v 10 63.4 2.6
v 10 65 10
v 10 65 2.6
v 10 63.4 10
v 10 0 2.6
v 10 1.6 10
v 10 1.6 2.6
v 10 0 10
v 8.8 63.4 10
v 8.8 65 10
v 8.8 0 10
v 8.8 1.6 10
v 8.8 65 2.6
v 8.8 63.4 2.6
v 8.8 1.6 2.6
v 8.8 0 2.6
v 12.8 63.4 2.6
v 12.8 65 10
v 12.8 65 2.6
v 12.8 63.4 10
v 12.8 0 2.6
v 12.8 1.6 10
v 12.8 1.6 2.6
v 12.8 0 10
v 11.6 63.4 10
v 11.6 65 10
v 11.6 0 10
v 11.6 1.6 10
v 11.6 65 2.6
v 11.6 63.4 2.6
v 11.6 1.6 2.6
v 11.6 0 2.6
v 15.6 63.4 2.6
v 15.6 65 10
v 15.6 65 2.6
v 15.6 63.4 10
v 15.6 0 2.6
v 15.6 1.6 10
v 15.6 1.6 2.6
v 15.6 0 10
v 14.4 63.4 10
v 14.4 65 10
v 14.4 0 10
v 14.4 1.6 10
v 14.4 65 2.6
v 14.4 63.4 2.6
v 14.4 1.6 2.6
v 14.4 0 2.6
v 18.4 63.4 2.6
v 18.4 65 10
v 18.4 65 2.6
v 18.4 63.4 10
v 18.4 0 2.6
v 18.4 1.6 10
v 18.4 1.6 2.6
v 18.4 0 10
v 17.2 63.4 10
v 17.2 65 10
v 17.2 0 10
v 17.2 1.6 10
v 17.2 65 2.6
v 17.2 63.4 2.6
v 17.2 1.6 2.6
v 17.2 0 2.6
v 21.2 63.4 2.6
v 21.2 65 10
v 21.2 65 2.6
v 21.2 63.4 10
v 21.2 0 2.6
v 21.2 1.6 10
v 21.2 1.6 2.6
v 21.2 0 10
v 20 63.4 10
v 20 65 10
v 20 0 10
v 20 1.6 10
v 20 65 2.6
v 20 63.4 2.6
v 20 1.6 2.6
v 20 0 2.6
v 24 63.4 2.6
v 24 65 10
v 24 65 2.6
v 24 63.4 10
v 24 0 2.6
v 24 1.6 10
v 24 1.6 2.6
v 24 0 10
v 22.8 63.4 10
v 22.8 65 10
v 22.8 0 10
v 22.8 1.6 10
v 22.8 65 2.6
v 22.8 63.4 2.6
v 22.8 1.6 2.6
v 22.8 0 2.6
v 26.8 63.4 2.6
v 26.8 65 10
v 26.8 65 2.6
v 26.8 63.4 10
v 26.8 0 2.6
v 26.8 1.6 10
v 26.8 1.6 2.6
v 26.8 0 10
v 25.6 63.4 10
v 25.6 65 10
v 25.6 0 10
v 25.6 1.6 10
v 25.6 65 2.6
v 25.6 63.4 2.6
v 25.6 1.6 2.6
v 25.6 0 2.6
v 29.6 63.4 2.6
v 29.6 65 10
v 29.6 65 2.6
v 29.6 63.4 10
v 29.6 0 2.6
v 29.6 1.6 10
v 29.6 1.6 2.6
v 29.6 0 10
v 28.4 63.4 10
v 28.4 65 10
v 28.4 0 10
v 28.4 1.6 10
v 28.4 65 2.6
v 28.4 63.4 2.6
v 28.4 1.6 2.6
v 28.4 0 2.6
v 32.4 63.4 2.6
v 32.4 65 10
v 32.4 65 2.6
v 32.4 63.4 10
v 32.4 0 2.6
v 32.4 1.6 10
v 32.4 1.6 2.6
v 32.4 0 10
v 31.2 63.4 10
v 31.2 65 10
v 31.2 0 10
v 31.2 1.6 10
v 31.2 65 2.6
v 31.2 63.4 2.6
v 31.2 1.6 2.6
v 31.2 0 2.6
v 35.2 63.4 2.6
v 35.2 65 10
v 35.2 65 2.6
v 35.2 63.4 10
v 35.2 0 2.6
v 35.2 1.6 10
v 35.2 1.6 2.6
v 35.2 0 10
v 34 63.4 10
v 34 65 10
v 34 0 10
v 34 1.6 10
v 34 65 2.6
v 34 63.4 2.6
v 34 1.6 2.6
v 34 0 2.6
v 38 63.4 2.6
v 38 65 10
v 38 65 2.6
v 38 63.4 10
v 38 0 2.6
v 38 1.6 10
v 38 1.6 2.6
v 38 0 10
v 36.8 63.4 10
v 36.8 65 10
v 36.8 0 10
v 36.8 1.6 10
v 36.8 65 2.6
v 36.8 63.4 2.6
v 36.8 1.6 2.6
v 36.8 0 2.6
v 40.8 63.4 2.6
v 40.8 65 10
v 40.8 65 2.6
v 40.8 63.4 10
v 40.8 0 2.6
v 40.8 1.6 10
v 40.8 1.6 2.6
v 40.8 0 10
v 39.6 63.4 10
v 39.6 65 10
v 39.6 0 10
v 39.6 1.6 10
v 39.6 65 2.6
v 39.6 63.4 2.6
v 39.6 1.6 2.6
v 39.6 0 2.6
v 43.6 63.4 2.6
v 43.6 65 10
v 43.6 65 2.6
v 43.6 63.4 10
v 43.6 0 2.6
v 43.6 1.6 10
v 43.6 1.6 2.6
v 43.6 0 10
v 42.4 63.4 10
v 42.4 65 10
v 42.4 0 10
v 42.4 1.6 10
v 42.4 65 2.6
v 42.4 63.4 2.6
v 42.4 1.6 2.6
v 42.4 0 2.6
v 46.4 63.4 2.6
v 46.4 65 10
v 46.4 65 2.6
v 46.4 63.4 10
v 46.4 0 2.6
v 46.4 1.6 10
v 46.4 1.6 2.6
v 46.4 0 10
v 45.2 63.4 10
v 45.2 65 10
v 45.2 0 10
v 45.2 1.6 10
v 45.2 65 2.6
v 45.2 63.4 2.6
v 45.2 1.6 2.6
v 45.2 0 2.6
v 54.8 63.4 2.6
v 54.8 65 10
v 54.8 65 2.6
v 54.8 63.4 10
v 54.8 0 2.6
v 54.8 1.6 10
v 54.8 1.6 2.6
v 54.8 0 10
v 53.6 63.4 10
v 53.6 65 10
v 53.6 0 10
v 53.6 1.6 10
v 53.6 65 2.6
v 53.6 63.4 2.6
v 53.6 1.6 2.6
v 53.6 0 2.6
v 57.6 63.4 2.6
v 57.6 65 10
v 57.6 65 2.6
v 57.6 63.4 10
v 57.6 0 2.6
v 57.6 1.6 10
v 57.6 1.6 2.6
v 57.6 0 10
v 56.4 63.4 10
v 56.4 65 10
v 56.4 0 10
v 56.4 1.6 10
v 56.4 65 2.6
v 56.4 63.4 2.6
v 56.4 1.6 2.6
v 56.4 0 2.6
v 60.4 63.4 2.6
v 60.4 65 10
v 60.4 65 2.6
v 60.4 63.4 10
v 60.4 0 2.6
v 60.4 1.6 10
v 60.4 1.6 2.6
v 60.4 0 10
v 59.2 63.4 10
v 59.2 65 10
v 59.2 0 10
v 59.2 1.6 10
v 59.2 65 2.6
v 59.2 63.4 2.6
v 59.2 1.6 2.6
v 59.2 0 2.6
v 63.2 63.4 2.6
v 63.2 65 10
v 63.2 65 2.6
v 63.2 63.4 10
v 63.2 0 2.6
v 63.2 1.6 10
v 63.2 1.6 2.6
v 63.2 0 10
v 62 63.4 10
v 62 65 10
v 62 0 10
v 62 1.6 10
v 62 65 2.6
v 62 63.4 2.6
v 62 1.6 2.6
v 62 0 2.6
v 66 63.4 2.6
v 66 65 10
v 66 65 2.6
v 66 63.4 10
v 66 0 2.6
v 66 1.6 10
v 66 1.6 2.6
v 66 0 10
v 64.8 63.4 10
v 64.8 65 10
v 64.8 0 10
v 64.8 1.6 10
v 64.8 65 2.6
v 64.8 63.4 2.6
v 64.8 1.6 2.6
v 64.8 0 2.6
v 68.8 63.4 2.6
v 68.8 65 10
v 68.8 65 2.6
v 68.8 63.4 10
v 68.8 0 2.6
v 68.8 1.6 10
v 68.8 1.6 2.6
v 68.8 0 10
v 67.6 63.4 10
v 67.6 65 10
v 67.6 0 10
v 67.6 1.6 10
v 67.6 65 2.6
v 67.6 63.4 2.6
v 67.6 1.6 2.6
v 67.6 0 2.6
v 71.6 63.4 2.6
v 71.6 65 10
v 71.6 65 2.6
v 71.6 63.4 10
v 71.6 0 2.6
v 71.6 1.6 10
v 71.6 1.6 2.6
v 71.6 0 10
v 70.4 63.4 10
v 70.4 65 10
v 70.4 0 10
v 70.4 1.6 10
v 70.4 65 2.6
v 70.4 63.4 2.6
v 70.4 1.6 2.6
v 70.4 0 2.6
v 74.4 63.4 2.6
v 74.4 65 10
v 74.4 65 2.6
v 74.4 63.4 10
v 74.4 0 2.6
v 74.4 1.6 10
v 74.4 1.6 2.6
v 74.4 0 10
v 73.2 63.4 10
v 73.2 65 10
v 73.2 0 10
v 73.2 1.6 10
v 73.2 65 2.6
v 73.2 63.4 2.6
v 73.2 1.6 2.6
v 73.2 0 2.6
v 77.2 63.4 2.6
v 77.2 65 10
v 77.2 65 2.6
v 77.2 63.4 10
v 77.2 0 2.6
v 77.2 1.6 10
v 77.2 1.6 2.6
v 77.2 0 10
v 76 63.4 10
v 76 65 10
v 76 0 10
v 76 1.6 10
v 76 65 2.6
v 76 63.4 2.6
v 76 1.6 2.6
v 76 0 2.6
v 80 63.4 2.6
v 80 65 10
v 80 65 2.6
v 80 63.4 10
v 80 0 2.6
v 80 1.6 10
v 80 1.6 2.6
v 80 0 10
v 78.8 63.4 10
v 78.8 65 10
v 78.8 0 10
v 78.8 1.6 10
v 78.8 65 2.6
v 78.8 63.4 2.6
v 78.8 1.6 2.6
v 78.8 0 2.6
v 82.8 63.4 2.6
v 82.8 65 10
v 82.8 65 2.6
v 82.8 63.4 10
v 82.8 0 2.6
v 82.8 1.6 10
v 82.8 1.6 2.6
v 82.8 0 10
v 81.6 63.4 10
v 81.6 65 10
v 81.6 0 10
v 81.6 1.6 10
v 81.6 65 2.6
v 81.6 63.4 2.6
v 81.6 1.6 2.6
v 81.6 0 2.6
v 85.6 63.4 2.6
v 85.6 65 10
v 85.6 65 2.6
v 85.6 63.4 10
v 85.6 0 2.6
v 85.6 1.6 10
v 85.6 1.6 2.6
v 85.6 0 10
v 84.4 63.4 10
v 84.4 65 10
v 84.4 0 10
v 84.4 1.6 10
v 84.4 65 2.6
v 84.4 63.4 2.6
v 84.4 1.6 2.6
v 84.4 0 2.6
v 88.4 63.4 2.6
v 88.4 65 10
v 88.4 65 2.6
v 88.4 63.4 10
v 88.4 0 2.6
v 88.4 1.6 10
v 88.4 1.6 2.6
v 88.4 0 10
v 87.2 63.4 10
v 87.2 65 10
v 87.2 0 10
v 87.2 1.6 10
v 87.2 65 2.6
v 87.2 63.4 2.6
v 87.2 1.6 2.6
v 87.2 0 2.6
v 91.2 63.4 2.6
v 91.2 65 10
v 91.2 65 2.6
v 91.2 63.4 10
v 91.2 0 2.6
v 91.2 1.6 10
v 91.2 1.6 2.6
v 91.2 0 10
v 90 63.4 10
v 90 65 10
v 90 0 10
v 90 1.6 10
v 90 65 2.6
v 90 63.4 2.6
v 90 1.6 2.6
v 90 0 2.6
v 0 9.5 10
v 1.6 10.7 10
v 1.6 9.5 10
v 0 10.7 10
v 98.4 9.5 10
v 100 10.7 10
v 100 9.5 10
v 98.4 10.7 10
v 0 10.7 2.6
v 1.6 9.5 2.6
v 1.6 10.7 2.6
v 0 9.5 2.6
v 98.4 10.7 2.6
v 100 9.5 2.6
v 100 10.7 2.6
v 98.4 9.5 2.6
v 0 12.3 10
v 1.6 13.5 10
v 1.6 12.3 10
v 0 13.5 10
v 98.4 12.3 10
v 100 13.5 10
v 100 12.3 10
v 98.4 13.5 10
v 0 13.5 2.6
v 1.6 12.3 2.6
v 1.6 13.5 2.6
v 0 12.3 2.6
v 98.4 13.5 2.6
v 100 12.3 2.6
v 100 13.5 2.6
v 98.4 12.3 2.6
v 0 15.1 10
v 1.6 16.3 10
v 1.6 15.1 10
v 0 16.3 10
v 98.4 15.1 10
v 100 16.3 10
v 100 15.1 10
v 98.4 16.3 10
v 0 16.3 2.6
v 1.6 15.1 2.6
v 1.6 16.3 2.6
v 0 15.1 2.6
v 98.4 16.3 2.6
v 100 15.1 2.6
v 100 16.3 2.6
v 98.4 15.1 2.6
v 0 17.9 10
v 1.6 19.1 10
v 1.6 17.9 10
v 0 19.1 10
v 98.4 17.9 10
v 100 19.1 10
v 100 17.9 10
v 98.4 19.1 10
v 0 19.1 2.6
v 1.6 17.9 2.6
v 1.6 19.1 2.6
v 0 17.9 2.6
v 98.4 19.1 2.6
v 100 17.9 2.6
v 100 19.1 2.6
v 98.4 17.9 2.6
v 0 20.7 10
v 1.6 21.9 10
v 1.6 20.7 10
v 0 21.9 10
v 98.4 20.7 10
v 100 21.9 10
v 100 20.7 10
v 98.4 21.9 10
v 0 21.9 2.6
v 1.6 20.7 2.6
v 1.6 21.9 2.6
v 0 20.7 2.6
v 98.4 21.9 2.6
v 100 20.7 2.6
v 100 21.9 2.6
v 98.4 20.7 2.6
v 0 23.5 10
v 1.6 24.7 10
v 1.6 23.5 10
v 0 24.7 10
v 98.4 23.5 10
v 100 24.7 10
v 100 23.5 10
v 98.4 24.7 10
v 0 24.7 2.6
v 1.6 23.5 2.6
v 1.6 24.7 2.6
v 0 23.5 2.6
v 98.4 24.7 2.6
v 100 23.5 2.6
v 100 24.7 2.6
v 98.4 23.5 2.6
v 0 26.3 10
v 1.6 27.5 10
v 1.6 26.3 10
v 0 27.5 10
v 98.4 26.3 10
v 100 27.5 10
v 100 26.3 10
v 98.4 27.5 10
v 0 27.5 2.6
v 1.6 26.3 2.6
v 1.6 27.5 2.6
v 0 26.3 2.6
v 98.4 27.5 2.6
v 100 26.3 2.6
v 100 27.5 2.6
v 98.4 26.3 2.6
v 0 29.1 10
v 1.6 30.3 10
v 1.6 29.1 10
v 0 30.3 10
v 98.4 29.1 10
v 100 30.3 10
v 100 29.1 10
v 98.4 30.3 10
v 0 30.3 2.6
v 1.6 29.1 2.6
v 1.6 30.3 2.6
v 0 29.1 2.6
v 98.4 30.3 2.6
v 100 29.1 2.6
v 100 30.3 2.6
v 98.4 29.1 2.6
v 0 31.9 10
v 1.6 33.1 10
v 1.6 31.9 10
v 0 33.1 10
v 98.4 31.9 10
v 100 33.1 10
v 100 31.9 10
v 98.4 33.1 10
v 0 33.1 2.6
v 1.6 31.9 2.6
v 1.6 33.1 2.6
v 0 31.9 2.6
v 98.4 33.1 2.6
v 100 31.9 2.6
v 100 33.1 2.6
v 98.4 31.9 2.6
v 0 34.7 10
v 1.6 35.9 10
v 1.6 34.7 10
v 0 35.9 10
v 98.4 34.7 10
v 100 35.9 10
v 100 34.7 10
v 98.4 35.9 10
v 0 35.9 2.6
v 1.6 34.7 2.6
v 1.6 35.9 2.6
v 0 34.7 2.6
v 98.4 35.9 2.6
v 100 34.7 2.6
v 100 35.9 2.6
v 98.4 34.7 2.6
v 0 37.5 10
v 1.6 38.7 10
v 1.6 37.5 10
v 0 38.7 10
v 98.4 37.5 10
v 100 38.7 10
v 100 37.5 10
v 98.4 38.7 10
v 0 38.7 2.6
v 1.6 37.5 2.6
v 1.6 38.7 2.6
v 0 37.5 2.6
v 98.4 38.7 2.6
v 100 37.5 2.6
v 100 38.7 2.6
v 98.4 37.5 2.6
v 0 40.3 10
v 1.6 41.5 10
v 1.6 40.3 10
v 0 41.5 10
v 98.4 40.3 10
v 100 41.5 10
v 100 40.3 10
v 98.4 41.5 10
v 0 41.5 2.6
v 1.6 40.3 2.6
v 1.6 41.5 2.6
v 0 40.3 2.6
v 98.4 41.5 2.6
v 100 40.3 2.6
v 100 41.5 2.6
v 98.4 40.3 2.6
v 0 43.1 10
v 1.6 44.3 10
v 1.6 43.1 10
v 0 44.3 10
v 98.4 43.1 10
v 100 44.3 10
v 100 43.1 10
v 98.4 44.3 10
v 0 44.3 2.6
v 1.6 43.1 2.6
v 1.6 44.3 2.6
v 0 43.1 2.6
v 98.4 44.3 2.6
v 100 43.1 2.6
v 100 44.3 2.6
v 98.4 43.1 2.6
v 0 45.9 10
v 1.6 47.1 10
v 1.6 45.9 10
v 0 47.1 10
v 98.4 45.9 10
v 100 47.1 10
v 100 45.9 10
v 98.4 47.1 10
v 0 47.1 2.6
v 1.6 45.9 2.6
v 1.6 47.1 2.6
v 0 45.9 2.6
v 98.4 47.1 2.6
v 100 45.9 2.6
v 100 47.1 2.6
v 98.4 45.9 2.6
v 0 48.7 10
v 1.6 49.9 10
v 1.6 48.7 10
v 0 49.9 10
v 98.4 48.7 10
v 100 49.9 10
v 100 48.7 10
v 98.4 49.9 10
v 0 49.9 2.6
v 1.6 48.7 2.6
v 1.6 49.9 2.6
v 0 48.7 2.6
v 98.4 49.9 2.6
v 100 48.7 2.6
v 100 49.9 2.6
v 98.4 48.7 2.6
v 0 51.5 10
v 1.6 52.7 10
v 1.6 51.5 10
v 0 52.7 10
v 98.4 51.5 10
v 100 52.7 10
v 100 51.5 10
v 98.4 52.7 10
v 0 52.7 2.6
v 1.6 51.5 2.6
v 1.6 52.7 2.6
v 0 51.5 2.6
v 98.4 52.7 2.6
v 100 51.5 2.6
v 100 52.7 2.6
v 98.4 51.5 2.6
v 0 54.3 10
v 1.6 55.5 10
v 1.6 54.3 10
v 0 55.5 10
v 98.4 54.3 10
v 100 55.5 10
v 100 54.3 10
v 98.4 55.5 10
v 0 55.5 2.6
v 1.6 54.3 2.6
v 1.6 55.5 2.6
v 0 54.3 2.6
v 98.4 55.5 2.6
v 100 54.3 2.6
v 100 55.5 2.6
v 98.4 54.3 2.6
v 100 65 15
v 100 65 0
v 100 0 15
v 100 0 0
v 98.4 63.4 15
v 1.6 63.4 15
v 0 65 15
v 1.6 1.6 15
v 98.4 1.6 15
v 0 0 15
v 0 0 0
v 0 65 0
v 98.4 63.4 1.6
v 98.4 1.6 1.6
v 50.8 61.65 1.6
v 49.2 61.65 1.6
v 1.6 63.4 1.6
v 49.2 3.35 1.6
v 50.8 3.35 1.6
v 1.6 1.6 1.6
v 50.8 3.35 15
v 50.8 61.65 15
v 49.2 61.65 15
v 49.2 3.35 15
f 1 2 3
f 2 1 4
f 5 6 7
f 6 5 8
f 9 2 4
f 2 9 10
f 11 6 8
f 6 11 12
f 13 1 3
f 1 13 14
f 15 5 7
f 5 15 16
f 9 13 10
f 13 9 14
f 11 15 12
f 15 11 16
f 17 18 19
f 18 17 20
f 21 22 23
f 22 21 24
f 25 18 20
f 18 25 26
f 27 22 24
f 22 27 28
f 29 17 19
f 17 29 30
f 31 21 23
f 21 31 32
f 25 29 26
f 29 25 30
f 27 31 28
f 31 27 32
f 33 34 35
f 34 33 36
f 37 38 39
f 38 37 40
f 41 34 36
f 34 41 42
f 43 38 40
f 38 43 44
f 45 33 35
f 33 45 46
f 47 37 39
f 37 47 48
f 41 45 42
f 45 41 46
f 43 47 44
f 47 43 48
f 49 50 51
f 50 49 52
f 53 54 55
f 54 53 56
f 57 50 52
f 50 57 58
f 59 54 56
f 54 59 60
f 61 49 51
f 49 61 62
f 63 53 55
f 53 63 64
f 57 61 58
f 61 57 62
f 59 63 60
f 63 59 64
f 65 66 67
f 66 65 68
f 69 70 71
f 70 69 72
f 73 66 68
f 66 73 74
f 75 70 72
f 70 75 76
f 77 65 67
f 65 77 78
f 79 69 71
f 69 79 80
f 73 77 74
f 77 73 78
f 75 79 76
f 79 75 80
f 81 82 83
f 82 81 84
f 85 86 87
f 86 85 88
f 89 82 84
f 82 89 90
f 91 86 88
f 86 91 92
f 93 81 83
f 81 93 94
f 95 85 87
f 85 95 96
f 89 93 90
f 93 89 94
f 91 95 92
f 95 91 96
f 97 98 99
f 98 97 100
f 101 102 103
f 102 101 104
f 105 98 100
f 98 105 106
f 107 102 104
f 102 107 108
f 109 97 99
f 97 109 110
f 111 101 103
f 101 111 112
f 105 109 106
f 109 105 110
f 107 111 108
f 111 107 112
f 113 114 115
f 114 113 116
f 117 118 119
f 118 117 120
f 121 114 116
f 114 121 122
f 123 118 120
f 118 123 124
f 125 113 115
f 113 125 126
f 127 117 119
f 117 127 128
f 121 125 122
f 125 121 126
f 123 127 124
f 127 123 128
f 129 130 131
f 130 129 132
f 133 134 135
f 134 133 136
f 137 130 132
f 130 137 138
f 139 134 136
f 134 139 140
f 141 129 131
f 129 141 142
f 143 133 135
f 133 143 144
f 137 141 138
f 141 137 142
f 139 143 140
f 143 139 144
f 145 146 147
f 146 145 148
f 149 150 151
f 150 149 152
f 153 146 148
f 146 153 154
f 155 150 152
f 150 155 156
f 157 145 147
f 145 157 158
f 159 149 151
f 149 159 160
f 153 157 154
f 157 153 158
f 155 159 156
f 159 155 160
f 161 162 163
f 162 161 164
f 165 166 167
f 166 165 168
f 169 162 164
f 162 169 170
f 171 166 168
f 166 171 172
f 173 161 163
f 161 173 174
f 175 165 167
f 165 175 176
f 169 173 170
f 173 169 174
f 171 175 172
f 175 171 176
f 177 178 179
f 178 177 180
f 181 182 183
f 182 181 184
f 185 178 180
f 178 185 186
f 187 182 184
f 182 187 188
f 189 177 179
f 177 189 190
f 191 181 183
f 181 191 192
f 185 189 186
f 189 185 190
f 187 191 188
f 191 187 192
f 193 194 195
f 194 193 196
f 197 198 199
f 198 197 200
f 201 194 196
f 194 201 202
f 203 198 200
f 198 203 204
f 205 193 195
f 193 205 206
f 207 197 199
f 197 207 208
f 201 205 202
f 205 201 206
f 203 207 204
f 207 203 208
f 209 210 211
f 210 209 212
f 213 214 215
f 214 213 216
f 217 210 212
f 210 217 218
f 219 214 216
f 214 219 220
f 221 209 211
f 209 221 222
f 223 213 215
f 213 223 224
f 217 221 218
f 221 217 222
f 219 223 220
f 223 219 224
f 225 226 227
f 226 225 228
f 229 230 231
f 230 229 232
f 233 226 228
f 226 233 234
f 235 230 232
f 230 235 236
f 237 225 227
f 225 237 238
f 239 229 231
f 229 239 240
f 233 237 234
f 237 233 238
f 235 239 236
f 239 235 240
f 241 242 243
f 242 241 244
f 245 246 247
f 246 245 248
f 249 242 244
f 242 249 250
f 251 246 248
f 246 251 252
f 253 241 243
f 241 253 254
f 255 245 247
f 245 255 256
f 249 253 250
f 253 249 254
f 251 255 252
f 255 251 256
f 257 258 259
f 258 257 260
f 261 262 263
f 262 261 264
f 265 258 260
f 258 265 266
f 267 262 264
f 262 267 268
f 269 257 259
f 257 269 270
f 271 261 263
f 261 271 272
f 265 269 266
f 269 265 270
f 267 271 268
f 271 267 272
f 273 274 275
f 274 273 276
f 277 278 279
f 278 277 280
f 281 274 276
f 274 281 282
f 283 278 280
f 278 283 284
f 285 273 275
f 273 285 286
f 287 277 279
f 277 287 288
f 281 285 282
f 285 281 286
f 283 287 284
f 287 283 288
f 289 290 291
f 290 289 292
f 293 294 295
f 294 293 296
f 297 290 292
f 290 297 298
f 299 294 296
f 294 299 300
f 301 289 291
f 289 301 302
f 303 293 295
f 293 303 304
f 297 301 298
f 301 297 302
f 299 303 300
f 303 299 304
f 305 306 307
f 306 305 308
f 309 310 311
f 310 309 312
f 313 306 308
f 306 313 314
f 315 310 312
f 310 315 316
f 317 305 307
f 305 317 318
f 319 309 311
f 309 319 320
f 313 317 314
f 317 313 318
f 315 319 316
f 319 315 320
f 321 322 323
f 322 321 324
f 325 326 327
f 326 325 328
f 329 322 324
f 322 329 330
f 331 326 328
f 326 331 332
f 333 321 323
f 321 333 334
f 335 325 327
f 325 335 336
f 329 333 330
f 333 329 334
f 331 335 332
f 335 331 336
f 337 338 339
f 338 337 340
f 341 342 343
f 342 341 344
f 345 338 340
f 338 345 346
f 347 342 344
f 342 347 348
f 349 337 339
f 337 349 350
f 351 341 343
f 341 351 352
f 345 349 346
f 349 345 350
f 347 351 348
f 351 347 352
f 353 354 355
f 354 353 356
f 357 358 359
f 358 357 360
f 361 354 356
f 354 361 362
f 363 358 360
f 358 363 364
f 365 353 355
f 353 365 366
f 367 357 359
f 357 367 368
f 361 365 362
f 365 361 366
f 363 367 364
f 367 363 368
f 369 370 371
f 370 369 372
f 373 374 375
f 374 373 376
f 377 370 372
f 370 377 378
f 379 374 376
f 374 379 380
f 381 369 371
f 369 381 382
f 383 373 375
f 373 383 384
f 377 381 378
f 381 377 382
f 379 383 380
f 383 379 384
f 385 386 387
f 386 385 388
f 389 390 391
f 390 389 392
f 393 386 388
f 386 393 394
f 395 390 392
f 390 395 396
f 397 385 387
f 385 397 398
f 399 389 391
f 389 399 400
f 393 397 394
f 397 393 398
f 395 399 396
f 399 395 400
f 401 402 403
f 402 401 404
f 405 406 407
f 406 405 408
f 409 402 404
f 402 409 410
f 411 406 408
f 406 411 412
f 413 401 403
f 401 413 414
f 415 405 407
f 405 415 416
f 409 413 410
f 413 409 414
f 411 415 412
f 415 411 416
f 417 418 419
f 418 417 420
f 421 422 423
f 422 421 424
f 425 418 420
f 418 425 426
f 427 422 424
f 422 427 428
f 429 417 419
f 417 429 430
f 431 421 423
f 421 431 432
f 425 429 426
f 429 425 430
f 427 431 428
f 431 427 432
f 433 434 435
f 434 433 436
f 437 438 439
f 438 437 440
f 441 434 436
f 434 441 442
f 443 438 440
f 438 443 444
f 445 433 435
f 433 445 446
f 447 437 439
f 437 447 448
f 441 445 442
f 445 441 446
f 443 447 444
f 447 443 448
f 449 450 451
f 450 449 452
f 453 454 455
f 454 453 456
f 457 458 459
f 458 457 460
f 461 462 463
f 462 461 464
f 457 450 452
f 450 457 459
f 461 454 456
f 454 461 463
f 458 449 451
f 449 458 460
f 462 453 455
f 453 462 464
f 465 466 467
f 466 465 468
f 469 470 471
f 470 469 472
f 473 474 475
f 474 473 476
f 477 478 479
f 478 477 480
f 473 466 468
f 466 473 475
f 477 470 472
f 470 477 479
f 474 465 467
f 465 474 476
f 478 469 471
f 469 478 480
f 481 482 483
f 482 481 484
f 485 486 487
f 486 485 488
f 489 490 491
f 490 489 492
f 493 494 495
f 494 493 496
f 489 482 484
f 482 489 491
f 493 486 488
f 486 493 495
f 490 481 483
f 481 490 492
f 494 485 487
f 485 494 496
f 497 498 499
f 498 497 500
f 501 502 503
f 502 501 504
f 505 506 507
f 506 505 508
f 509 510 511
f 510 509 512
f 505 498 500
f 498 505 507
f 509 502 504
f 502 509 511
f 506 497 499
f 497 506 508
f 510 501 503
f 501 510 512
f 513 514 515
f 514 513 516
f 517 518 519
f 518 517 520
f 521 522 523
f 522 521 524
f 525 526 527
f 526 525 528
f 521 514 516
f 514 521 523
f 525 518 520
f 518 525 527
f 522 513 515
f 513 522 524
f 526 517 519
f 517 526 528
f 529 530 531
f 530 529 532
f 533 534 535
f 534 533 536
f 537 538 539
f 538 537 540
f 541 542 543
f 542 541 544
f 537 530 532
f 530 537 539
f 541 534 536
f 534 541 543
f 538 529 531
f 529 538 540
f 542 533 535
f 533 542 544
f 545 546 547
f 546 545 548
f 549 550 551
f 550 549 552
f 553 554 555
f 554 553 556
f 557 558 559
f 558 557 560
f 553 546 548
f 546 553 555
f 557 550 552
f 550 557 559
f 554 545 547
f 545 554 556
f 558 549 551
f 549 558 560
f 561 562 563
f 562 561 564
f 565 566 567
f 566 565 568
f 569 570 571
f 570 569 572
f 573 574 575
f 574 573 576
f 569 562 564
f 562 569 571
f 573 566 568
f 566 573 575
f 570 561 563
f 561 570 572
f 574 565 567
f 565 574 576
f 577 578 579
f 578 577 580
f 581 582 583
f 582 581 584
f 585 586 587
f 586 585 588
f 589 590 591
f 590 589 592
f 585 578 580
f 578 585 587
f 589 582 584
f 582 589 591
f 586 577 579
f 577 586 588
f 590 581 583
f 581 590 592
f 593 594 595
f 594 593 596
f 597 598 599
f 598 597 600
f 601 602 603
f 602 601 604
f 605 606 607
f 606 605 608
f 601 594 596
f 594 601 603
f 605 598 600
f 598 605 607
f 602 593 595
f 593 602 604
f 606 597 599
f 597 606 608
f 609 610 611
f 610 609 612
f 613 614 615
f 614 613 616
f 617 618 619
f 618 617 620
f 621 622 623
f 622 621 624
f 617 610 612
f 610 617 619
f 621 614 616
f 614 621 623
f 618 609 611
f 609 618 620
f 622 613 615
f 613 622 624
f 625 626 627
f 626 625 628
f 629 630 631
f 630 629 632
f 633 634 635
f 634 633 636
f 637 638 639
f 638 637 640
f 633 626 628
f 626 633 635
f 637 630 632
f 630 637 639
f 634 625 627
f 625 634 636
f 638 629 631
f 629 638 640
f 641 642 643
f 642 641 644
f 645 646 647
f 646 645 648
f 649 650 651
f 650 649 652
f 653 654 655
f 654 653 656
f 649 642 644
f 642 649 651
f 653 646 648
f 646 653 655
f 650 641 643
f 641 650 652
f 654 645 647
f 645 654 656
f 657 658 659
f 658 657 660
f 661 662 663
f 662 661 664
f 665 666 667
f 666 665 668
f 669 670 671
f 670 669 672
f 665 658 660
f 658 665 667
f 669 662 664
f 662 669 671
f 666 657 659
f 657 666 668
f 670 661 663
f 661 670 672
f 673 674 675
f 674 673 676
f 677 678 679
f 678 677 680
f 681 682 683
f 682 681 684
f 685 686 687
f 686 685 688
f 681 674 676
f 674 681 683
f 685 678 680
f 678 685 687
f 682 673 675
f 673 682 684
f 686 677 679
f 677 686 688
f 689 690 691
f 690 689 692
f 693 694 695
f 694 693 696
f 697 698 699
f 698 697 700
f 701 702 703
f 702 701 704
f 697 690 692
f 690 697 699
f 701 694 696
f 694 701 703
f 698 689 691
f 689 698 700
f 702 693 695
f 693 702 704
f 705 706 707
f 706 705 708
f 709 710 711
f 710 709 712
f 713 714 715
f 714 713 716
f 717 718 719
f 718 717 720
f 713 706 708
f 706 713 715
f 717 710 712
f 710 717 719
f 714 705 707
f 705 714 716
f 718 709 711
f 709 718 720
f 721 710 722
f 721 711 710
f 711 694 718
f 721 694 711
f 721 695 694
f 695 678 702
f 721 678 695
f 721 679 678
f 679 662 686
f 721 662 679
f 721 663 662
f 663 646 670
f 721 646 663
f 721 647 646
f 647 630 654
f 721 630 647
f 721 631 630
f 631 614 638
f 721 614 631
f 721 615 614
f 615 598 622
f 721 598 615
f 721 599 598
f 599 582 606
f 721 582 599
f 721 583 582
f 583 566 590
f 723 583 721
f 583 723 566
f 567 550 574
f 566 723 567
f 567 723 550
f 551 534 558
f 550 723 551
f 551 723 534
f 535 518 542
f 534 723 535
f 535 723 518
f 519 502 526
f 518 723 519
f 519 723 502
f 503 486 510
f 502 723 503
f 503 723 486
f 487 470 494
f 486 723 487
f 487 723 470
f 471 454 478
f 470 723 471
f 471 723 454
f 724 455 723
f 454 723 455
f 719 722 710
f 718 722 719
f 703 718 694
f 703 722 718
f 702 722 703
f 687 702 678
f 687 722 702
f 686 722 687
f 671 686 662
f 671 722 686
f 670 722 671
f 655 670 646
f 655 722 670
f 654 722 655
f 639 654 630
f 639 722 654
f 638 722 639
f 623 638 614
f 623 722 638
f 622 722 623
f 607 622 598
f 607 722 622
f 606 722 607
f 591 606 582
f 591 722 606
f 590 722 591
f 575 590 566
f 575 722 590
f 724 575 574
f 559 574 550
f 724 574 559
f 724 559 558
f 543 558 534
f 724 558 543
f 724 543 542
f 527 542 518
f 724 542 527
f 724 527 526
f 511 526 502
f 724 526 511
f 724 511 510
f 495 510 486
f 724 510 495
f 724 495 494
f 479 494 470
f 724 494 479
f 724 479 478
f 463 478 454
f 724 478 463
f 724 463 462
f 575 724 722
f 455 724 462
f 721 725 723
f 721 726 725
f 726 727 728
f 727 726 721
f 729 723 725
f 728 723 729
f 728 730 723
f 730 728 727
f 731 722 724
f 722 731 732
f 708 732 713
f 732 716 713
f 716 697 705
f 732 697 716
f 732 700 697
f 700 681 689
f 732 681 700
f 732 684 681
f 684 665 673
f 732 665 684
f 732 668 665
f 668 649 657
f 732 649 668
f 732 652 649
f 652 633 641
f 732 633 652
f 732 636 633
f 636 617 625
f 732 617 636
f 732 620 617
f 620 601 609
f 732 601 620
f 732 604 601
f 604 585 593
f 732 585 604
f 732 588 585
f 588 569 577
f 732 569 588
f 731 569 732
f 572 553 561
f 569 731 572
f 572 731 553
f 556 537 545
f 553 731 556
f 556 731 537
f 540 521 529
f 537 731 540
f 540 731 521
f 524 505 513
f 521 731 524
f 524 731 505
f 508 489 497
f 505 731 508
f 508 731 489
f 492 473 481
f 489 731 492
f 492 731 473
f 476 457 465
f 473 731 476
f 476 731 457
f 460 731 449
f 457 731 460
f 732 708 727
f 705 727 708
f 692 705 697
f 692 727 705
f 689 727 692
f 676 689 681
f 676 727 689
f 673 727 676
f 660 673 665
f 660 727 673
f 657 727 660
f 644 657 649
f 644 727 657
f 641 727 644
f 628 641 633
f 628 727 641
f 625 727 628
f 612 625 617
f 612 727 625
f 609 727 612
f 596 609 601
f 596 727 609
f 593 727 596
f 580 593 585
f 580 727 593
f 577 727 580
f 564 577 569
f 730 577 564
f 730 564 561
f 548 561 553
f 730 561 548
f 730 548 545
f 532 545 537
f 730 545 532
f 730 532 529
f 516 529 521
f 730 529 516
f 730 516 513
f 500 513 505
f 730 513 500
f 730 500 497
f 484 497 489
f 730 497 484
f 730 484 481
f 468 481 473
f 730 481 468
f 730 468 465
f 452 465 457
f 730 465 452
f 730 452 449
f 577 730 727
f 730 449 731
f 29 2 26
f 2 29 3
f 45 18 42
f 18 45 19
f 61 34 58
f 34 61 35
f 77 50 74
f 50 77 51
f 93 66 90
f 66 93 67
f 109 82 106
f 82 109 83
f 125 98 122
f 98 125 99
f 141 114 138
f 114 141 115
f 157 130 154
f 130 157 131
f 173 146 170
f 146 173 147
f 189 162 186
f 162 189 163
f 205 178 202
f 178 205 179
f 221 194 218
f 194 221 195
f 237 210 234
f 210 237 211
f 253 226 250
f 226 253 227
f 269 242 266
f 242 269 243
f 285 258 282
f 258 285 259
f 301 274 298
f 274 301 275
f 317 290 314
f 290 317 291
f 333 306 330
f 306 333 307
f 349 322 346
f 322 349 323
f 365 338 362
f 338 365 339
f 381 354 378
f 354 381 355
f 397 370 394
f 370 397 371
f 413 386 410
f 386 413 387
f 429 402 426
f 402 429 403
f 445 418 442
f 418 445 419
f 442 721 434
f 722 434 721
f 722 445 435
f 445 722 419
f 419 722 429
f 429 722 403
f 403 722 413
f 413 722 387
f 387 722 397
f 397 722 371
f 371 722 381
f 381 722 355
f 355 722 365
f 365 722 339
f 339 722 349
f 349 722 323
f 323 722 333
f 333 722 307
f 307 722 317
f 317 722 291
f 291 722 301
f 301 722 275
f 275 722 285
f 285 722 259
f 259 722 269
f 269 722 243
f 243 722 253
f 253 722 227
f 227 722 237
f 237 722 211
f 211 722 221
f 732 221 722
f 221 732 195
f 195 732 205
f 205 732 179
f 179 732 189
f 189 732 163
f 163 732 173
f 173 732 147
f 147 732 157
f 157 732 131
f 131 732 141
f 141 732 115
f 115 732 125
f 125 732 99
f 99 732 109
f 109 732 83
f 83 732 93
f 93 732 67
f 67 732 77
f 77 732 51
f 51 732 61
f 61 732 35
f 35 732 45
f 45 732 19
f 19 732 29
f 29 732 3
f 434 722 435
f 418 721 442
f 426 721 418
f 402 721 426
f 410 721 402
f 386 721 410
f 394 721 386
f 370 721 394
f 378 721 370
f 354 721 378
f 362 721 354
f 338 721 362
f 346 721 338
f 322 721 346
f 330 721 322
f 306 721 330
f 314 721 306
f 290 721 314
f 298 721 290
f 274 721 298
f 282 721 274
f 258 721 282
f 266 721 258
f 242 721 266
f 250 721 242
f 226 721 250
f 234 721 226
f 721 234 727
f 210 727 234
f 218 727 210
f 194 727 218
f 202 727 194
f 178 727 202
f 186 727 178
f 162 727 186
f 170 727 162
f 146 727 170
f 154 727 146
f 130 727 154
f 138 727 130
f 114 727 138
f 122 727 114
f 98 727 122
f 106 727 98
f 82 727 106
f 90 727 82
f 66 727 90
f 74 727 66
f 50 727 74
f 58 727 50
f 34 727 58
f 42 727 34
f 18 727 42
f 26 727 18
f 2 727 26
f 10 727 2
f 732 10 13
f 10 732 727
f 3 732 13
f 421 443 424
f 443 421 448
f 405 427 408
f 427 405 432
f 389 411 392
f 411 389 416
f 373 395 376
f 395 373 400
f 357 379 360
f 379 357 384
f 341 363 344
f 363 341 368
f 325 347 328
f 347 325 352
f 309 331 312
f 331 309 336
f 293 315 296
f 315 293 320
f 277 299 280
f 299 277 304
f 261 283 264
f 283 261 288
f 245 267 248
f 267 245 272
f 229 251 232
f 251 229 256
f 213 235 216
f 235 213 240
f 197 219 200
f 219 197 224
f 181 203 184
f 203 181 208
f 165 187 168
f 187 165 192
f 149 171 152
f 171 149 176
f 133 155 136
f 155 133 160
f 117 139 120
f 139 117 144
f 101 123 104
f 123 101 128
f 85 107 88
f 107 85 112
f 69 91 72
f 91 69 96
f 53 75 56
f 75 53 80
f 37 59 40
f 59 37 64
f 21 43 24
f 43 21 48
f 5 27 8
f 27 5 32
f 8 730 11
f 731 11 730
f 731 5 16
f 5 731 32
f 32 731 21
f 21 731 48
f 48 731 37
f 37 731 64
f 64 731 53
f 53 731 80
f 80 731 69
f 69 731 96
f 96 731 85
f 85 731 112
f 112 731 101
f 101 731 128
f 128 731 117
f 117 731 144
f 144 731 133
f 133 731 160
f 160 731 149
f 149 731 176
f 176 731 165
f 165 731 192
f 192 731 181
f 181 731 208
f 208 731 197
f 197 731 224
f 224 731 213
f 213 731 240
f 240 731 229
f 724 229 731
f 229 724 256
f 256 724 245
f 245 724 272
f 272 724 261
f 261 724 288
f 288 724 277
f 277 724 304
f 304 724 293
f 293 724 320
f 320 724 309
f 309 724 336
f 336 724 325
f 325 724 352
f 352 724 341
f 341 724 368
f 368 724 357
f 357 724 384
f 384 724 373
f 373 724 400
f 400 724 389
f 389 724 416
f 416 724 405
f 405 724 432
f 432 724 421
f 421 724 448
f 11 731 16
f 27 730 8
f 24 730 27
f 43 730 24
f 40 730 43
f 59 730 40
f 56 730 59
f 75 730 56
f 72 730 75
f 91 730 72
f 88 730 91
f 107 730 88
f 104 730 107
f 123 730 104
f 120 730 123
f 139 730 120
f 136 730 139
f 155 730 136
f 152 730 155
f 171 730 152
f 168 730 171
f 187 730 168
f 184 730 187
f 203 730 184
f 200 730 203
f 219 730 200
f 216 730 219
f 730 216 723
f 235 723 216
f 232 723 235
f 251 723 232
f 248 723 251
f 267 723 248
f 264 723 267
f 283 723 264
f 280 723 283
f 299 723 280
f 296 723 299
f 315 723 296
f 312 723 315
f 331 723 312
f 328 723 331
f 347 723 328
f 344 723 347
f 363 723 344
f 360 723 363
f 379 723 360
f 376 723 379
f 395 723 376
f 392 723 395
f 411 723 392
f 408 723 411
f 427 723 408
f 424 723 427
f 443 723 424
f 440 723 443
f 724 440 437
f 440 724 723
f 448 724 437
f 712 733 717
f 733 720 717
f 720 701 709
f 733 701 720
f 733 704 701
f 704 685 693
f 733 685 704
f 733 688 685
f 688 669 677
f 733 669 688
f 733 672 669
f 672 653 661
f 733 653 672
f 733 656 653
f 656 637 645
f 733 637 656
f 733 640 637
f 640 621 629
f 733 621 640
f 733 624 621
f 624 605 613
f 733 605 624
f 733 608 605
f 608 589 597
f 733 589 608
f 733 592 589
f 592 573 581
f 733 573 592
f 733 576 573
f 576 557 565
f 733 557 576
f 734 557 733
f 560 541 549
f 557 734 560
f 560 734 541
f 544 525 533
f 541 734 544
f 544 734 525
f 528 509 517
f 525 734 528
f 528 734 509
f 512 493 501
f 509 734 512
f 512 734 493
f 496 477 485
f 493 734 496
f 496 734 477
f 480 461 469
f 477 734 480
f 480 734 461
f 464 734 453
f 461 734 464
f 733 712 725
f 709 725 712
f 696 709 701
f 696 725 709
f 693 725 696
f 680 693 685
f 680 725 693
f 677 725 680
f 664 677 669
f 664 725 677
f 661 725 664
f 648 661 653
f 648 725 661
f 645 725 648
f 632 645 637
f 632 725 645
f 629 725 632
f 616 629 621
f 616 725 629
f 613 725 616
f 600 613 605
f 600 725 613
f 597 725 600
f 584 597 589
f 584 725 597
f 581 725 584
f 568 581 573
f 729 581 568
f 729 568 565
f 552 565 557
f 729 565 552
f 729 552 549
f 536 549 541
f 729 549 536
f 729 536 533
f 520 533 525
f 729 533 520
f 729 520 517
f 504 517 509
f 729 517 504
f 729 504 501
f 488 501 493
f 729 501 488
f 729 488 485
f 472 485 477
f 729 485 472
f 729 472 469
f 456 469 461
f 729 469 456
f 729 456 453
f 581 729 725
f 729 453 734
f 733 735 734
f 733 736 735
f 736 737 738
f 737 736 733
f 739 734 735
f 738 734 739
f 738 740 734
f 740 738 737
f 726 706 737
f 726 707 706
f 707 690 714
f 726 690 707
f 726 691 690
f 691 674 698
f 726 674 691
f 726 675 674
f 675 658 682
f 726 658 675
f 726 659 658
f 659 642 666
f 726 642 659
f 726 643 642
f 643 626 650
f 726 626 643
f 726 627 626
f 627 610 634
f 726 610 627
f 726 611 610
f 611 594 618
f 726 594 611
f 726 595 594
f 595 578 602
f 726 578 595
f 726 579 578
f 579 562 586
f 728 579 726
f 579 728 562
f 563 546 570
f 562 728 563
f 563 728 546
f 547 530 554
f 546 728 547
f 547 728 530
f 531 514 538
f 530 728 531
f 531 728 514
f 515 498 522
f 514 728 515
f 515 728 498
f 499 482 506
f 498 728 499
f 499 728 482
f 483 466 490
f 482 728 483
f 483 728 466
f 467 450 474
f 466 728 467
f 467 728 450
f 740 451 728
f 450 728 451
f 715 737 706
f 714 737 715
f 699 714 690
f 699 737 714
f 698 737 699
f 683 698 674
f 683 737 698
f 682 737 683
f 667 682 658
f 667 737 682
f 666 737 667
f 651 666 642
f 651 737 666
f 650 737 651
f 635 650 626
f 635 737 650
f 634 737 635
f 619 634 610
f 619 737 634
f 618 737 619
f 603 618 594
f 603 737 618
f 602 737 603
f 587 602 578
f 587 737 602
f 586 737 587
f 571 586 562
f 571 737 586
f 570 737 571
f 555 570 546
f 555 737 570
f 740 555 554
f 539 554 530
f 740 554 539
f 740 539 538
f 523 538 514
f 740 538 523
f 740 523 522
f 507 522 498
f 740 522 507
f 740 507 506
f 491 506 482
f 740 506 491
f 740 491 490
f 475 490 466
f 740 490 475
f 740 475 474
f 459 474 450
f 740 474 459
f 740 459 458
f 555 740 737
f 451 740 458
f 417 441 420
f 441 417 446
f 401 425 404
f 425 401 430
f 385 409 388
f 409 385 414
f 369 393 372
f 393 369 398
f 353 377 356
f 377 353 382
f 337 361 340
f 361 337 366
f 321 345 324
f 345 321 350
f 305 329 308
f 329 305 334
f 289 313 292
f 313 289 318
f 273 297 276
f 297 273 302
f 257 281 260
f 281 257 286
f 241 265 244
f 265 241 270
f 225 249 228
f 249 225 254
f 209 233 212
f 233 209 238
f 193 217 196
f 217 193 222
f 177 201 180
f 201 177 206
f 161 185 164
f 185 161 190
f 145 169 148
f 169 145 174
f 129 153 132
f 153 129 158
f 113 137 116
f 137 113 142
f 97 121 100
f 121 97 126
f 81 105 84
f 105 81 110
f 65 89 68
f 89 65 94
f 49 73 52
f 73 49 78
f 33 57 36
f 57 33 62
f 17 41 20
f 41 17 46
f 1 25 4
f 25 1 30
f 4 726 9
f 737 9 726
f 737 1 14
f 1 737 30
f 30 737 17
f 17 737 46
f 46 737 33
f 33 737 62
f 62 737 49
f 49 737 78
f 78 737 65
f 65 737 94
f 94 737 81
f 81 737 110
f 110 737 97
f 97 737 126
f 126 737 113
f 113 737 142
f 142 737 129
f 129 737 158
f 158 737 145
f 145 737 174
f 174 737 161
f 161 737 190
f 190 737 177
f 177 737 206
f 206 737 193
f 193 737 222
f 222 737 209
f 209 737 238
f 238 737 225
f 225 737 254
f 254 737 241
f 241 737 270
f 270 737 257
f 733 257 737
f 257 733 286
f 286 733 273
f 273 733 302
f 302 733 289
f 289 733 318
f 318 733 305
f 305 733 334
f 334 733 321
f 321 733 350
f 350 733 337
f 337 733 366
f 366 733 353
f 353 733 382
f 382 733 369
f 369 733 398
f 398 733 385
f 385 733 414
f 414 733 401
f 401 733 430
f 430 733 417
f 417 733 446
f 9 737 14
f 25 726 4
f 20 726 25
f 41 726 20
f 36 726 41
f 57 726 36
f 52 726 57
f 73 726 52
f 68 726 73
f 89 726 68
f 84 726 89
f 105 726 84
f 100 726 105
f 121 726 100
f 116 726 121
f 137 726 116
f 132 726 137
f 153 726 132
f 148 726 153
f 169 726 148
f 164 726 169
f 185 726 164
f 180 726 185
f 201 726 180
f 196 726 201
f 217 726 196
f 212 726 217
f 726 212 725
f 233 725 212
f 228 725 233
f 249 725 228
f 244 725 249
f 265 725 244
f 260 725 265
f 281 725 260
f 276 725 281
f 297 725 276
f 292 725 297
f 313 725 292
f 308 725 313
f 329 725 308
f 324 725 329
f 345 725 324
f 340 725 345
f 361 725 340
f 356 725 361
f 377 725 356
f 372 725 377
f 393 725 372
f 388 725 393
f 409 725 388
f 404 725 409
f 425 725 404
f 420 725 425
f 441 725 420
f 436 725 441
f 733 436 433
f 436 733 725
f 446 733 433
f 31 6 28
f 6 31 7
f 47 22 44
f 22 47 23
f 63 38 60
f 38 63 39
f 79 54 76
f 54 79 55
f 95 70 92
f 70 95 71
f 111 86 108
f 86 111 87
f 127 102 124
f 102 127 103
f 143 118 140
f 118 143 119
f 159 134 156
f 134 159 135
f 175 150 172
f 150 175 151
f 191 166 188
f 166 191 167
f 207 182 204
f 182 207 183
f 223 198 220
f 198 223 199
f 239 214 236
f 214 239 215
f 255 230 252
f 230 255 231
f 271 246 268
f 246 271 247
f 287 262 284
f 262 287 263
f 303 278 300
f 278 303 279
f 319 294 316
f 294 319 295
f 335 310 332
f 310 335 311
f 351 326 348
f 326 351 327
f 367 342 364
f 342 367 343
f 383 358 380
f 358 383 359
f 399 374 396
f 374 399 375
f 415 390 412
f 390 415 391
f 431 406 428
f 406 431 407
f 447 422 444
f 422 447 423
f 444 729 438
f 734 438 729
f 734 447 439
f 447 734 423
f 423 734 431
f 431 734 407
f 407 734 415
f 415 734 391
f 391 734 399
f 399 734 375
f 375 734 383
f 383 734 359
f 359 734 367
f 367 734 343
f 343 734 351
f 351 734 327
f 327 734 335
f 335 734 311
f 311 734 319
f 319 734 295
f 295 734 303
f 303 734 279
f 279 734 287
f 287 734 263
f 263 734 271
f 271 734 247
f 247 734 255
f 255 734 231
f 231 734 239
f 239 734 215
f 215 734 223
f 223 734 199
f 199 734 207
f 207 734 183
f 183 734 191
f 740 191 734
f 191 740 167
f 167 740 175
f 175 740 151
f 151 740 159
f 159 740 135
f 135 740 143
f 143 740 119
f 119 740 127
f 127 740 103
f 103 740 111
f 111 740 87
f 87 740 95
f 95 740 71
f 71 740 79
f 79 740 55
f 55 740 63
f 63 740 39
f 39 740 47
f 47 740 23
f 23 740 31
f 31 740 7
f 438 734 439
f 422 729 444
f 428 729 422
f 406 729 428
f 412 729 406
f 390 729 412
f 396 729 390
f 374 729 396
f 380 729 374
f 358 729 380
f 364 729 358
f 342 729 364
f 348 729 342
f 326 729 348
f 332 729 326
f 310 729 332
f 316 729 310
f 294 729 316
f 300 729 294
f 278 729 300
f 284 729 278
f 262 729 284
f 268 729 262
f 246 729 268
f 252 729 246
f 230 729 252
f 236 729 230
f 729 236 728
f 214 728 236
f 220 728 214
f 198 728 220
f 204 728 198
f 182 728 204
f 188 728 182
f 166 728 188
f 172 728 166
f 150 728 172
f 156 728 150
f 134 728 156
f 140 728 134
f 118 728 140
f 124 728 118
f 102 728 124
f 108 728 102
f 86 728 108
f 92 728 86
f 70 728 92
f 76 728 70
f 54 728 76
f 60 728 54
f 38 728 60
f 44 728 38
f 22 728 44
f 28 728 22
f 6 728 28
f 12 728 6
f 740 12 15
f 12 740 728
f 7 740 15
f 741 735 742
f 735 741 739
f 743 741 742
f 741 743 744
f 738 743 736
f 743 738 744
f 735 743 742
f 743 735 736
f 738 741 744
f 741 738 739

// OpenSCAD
// Desiccant tray: box with vent windows and a divider, slotted lid.
// Render: openscad -D 'part="box"' -o tray-box.stl tray.scad   (part = "box" | "lid")
// Print both as rendered (flat side down), PETG, no supports.

part = "box";

L = 100;      // length (x)
W = 65;       // width (y)
H = 15;       // box height
wall = 1.6;   // walls, floor, lid plate

// Vent windows in the box walls: 1.2 wide, every 2.8, from z 2.6 to 10.
win_w = 1.2;
pitch = 2.8;
win_z0 = 2.6;
win_z1 = 10;
win_margin = 7;      // inner wall → first window
div_w = 1.6;         // divider in the middle (x)
div_gap = 1.75;      // divider end → inner wall (room for the lid lip)
div_clear = 2.4;     // no windows within this of the divider

// Lid: lip that drops into the box, slots for air.
lip_gap = 0.15;      // per side, lip → box inner wall
lip_t = 1.2;
lip_h = 4;
slot_w = 1.2;
slot_margin = 4.95;  // lid edge → slot ends (y)
slot_x0 = 4.6;       // first slot (x), mirrored on the other half
slot_n = 15;         // slots per half

eps = 0.01;

// Windows centred along a wall of inner length len.
function win_count(len) = floor((len - 2 * win_margin + (pitch - win_w)) / pitch + 1e-6);
function win_start(len) = (len - (win_count(len) * pitch - (pitch - win_w))) / 2;

module box() {
  difference() {
    cube([L, W, H]);
    translate([wall, wall, wall]) cube([L - 2 * wall, W - 2 * wall, H]);
    // long walls (y = 0 and y = W), windows along x
    for (i = [0 : win_count(L - 2 * wall) - 1]) {
      x = wall + win_start(L - 2 * wall) + i * pitch;
      if (x + win_w < L / 2 - div_w / 2 - div_clear || x > L / 2 + div_w / 2 + div_clear)
        translate([x, -eps, win_z0]) cube([win_w, W + 2 * eps, win_z1 - win_z0]);
    }
    // short walls (x = 0 and x = L), windows along y
    for (i = [0 : win_count(W - 2 * wall) - 1])
      translate([-eps, wall + win_start(W - 2 * wall) + i * pitch, win_z0])
        cube([L + 2 * eps, win_w, win_z1 - win_z0]);
  }
  // divider
  translate([L / 2 - div_w / 2, wall + div_gap, 0])
    cube([div_w, W - 2 * (wall + div_gap), H]);
}

module lid() {
  lip_o = wall + lip_gap;  // lip outer edge from the lid edge
  difference() {
    cube([L, W, wall]);
    for (i = [0 : slot_n - 1], x = [slot_x0 + i * pitch, L - slot_x0 - slot_w - i * pitch])
      translate([x, slot_margin, -eps]) cube([slot_w, W - 2 * slot_margin, wall + 2 * eps]);
  }
  translate([lip_o, lip_o, wall]) difference() {
    cube([L - 2 * lip_o, W - 2 * lip_o, lip_h]);
    translate([lip_t, lip_t, -eps]) cube([L - 2 * lip_o - 2 * lip_t, W - 2 * lip_o - 2 * lip_t, lip_h + 2 * eps]);
  }
}

if (part == "box") box();
else lid();
